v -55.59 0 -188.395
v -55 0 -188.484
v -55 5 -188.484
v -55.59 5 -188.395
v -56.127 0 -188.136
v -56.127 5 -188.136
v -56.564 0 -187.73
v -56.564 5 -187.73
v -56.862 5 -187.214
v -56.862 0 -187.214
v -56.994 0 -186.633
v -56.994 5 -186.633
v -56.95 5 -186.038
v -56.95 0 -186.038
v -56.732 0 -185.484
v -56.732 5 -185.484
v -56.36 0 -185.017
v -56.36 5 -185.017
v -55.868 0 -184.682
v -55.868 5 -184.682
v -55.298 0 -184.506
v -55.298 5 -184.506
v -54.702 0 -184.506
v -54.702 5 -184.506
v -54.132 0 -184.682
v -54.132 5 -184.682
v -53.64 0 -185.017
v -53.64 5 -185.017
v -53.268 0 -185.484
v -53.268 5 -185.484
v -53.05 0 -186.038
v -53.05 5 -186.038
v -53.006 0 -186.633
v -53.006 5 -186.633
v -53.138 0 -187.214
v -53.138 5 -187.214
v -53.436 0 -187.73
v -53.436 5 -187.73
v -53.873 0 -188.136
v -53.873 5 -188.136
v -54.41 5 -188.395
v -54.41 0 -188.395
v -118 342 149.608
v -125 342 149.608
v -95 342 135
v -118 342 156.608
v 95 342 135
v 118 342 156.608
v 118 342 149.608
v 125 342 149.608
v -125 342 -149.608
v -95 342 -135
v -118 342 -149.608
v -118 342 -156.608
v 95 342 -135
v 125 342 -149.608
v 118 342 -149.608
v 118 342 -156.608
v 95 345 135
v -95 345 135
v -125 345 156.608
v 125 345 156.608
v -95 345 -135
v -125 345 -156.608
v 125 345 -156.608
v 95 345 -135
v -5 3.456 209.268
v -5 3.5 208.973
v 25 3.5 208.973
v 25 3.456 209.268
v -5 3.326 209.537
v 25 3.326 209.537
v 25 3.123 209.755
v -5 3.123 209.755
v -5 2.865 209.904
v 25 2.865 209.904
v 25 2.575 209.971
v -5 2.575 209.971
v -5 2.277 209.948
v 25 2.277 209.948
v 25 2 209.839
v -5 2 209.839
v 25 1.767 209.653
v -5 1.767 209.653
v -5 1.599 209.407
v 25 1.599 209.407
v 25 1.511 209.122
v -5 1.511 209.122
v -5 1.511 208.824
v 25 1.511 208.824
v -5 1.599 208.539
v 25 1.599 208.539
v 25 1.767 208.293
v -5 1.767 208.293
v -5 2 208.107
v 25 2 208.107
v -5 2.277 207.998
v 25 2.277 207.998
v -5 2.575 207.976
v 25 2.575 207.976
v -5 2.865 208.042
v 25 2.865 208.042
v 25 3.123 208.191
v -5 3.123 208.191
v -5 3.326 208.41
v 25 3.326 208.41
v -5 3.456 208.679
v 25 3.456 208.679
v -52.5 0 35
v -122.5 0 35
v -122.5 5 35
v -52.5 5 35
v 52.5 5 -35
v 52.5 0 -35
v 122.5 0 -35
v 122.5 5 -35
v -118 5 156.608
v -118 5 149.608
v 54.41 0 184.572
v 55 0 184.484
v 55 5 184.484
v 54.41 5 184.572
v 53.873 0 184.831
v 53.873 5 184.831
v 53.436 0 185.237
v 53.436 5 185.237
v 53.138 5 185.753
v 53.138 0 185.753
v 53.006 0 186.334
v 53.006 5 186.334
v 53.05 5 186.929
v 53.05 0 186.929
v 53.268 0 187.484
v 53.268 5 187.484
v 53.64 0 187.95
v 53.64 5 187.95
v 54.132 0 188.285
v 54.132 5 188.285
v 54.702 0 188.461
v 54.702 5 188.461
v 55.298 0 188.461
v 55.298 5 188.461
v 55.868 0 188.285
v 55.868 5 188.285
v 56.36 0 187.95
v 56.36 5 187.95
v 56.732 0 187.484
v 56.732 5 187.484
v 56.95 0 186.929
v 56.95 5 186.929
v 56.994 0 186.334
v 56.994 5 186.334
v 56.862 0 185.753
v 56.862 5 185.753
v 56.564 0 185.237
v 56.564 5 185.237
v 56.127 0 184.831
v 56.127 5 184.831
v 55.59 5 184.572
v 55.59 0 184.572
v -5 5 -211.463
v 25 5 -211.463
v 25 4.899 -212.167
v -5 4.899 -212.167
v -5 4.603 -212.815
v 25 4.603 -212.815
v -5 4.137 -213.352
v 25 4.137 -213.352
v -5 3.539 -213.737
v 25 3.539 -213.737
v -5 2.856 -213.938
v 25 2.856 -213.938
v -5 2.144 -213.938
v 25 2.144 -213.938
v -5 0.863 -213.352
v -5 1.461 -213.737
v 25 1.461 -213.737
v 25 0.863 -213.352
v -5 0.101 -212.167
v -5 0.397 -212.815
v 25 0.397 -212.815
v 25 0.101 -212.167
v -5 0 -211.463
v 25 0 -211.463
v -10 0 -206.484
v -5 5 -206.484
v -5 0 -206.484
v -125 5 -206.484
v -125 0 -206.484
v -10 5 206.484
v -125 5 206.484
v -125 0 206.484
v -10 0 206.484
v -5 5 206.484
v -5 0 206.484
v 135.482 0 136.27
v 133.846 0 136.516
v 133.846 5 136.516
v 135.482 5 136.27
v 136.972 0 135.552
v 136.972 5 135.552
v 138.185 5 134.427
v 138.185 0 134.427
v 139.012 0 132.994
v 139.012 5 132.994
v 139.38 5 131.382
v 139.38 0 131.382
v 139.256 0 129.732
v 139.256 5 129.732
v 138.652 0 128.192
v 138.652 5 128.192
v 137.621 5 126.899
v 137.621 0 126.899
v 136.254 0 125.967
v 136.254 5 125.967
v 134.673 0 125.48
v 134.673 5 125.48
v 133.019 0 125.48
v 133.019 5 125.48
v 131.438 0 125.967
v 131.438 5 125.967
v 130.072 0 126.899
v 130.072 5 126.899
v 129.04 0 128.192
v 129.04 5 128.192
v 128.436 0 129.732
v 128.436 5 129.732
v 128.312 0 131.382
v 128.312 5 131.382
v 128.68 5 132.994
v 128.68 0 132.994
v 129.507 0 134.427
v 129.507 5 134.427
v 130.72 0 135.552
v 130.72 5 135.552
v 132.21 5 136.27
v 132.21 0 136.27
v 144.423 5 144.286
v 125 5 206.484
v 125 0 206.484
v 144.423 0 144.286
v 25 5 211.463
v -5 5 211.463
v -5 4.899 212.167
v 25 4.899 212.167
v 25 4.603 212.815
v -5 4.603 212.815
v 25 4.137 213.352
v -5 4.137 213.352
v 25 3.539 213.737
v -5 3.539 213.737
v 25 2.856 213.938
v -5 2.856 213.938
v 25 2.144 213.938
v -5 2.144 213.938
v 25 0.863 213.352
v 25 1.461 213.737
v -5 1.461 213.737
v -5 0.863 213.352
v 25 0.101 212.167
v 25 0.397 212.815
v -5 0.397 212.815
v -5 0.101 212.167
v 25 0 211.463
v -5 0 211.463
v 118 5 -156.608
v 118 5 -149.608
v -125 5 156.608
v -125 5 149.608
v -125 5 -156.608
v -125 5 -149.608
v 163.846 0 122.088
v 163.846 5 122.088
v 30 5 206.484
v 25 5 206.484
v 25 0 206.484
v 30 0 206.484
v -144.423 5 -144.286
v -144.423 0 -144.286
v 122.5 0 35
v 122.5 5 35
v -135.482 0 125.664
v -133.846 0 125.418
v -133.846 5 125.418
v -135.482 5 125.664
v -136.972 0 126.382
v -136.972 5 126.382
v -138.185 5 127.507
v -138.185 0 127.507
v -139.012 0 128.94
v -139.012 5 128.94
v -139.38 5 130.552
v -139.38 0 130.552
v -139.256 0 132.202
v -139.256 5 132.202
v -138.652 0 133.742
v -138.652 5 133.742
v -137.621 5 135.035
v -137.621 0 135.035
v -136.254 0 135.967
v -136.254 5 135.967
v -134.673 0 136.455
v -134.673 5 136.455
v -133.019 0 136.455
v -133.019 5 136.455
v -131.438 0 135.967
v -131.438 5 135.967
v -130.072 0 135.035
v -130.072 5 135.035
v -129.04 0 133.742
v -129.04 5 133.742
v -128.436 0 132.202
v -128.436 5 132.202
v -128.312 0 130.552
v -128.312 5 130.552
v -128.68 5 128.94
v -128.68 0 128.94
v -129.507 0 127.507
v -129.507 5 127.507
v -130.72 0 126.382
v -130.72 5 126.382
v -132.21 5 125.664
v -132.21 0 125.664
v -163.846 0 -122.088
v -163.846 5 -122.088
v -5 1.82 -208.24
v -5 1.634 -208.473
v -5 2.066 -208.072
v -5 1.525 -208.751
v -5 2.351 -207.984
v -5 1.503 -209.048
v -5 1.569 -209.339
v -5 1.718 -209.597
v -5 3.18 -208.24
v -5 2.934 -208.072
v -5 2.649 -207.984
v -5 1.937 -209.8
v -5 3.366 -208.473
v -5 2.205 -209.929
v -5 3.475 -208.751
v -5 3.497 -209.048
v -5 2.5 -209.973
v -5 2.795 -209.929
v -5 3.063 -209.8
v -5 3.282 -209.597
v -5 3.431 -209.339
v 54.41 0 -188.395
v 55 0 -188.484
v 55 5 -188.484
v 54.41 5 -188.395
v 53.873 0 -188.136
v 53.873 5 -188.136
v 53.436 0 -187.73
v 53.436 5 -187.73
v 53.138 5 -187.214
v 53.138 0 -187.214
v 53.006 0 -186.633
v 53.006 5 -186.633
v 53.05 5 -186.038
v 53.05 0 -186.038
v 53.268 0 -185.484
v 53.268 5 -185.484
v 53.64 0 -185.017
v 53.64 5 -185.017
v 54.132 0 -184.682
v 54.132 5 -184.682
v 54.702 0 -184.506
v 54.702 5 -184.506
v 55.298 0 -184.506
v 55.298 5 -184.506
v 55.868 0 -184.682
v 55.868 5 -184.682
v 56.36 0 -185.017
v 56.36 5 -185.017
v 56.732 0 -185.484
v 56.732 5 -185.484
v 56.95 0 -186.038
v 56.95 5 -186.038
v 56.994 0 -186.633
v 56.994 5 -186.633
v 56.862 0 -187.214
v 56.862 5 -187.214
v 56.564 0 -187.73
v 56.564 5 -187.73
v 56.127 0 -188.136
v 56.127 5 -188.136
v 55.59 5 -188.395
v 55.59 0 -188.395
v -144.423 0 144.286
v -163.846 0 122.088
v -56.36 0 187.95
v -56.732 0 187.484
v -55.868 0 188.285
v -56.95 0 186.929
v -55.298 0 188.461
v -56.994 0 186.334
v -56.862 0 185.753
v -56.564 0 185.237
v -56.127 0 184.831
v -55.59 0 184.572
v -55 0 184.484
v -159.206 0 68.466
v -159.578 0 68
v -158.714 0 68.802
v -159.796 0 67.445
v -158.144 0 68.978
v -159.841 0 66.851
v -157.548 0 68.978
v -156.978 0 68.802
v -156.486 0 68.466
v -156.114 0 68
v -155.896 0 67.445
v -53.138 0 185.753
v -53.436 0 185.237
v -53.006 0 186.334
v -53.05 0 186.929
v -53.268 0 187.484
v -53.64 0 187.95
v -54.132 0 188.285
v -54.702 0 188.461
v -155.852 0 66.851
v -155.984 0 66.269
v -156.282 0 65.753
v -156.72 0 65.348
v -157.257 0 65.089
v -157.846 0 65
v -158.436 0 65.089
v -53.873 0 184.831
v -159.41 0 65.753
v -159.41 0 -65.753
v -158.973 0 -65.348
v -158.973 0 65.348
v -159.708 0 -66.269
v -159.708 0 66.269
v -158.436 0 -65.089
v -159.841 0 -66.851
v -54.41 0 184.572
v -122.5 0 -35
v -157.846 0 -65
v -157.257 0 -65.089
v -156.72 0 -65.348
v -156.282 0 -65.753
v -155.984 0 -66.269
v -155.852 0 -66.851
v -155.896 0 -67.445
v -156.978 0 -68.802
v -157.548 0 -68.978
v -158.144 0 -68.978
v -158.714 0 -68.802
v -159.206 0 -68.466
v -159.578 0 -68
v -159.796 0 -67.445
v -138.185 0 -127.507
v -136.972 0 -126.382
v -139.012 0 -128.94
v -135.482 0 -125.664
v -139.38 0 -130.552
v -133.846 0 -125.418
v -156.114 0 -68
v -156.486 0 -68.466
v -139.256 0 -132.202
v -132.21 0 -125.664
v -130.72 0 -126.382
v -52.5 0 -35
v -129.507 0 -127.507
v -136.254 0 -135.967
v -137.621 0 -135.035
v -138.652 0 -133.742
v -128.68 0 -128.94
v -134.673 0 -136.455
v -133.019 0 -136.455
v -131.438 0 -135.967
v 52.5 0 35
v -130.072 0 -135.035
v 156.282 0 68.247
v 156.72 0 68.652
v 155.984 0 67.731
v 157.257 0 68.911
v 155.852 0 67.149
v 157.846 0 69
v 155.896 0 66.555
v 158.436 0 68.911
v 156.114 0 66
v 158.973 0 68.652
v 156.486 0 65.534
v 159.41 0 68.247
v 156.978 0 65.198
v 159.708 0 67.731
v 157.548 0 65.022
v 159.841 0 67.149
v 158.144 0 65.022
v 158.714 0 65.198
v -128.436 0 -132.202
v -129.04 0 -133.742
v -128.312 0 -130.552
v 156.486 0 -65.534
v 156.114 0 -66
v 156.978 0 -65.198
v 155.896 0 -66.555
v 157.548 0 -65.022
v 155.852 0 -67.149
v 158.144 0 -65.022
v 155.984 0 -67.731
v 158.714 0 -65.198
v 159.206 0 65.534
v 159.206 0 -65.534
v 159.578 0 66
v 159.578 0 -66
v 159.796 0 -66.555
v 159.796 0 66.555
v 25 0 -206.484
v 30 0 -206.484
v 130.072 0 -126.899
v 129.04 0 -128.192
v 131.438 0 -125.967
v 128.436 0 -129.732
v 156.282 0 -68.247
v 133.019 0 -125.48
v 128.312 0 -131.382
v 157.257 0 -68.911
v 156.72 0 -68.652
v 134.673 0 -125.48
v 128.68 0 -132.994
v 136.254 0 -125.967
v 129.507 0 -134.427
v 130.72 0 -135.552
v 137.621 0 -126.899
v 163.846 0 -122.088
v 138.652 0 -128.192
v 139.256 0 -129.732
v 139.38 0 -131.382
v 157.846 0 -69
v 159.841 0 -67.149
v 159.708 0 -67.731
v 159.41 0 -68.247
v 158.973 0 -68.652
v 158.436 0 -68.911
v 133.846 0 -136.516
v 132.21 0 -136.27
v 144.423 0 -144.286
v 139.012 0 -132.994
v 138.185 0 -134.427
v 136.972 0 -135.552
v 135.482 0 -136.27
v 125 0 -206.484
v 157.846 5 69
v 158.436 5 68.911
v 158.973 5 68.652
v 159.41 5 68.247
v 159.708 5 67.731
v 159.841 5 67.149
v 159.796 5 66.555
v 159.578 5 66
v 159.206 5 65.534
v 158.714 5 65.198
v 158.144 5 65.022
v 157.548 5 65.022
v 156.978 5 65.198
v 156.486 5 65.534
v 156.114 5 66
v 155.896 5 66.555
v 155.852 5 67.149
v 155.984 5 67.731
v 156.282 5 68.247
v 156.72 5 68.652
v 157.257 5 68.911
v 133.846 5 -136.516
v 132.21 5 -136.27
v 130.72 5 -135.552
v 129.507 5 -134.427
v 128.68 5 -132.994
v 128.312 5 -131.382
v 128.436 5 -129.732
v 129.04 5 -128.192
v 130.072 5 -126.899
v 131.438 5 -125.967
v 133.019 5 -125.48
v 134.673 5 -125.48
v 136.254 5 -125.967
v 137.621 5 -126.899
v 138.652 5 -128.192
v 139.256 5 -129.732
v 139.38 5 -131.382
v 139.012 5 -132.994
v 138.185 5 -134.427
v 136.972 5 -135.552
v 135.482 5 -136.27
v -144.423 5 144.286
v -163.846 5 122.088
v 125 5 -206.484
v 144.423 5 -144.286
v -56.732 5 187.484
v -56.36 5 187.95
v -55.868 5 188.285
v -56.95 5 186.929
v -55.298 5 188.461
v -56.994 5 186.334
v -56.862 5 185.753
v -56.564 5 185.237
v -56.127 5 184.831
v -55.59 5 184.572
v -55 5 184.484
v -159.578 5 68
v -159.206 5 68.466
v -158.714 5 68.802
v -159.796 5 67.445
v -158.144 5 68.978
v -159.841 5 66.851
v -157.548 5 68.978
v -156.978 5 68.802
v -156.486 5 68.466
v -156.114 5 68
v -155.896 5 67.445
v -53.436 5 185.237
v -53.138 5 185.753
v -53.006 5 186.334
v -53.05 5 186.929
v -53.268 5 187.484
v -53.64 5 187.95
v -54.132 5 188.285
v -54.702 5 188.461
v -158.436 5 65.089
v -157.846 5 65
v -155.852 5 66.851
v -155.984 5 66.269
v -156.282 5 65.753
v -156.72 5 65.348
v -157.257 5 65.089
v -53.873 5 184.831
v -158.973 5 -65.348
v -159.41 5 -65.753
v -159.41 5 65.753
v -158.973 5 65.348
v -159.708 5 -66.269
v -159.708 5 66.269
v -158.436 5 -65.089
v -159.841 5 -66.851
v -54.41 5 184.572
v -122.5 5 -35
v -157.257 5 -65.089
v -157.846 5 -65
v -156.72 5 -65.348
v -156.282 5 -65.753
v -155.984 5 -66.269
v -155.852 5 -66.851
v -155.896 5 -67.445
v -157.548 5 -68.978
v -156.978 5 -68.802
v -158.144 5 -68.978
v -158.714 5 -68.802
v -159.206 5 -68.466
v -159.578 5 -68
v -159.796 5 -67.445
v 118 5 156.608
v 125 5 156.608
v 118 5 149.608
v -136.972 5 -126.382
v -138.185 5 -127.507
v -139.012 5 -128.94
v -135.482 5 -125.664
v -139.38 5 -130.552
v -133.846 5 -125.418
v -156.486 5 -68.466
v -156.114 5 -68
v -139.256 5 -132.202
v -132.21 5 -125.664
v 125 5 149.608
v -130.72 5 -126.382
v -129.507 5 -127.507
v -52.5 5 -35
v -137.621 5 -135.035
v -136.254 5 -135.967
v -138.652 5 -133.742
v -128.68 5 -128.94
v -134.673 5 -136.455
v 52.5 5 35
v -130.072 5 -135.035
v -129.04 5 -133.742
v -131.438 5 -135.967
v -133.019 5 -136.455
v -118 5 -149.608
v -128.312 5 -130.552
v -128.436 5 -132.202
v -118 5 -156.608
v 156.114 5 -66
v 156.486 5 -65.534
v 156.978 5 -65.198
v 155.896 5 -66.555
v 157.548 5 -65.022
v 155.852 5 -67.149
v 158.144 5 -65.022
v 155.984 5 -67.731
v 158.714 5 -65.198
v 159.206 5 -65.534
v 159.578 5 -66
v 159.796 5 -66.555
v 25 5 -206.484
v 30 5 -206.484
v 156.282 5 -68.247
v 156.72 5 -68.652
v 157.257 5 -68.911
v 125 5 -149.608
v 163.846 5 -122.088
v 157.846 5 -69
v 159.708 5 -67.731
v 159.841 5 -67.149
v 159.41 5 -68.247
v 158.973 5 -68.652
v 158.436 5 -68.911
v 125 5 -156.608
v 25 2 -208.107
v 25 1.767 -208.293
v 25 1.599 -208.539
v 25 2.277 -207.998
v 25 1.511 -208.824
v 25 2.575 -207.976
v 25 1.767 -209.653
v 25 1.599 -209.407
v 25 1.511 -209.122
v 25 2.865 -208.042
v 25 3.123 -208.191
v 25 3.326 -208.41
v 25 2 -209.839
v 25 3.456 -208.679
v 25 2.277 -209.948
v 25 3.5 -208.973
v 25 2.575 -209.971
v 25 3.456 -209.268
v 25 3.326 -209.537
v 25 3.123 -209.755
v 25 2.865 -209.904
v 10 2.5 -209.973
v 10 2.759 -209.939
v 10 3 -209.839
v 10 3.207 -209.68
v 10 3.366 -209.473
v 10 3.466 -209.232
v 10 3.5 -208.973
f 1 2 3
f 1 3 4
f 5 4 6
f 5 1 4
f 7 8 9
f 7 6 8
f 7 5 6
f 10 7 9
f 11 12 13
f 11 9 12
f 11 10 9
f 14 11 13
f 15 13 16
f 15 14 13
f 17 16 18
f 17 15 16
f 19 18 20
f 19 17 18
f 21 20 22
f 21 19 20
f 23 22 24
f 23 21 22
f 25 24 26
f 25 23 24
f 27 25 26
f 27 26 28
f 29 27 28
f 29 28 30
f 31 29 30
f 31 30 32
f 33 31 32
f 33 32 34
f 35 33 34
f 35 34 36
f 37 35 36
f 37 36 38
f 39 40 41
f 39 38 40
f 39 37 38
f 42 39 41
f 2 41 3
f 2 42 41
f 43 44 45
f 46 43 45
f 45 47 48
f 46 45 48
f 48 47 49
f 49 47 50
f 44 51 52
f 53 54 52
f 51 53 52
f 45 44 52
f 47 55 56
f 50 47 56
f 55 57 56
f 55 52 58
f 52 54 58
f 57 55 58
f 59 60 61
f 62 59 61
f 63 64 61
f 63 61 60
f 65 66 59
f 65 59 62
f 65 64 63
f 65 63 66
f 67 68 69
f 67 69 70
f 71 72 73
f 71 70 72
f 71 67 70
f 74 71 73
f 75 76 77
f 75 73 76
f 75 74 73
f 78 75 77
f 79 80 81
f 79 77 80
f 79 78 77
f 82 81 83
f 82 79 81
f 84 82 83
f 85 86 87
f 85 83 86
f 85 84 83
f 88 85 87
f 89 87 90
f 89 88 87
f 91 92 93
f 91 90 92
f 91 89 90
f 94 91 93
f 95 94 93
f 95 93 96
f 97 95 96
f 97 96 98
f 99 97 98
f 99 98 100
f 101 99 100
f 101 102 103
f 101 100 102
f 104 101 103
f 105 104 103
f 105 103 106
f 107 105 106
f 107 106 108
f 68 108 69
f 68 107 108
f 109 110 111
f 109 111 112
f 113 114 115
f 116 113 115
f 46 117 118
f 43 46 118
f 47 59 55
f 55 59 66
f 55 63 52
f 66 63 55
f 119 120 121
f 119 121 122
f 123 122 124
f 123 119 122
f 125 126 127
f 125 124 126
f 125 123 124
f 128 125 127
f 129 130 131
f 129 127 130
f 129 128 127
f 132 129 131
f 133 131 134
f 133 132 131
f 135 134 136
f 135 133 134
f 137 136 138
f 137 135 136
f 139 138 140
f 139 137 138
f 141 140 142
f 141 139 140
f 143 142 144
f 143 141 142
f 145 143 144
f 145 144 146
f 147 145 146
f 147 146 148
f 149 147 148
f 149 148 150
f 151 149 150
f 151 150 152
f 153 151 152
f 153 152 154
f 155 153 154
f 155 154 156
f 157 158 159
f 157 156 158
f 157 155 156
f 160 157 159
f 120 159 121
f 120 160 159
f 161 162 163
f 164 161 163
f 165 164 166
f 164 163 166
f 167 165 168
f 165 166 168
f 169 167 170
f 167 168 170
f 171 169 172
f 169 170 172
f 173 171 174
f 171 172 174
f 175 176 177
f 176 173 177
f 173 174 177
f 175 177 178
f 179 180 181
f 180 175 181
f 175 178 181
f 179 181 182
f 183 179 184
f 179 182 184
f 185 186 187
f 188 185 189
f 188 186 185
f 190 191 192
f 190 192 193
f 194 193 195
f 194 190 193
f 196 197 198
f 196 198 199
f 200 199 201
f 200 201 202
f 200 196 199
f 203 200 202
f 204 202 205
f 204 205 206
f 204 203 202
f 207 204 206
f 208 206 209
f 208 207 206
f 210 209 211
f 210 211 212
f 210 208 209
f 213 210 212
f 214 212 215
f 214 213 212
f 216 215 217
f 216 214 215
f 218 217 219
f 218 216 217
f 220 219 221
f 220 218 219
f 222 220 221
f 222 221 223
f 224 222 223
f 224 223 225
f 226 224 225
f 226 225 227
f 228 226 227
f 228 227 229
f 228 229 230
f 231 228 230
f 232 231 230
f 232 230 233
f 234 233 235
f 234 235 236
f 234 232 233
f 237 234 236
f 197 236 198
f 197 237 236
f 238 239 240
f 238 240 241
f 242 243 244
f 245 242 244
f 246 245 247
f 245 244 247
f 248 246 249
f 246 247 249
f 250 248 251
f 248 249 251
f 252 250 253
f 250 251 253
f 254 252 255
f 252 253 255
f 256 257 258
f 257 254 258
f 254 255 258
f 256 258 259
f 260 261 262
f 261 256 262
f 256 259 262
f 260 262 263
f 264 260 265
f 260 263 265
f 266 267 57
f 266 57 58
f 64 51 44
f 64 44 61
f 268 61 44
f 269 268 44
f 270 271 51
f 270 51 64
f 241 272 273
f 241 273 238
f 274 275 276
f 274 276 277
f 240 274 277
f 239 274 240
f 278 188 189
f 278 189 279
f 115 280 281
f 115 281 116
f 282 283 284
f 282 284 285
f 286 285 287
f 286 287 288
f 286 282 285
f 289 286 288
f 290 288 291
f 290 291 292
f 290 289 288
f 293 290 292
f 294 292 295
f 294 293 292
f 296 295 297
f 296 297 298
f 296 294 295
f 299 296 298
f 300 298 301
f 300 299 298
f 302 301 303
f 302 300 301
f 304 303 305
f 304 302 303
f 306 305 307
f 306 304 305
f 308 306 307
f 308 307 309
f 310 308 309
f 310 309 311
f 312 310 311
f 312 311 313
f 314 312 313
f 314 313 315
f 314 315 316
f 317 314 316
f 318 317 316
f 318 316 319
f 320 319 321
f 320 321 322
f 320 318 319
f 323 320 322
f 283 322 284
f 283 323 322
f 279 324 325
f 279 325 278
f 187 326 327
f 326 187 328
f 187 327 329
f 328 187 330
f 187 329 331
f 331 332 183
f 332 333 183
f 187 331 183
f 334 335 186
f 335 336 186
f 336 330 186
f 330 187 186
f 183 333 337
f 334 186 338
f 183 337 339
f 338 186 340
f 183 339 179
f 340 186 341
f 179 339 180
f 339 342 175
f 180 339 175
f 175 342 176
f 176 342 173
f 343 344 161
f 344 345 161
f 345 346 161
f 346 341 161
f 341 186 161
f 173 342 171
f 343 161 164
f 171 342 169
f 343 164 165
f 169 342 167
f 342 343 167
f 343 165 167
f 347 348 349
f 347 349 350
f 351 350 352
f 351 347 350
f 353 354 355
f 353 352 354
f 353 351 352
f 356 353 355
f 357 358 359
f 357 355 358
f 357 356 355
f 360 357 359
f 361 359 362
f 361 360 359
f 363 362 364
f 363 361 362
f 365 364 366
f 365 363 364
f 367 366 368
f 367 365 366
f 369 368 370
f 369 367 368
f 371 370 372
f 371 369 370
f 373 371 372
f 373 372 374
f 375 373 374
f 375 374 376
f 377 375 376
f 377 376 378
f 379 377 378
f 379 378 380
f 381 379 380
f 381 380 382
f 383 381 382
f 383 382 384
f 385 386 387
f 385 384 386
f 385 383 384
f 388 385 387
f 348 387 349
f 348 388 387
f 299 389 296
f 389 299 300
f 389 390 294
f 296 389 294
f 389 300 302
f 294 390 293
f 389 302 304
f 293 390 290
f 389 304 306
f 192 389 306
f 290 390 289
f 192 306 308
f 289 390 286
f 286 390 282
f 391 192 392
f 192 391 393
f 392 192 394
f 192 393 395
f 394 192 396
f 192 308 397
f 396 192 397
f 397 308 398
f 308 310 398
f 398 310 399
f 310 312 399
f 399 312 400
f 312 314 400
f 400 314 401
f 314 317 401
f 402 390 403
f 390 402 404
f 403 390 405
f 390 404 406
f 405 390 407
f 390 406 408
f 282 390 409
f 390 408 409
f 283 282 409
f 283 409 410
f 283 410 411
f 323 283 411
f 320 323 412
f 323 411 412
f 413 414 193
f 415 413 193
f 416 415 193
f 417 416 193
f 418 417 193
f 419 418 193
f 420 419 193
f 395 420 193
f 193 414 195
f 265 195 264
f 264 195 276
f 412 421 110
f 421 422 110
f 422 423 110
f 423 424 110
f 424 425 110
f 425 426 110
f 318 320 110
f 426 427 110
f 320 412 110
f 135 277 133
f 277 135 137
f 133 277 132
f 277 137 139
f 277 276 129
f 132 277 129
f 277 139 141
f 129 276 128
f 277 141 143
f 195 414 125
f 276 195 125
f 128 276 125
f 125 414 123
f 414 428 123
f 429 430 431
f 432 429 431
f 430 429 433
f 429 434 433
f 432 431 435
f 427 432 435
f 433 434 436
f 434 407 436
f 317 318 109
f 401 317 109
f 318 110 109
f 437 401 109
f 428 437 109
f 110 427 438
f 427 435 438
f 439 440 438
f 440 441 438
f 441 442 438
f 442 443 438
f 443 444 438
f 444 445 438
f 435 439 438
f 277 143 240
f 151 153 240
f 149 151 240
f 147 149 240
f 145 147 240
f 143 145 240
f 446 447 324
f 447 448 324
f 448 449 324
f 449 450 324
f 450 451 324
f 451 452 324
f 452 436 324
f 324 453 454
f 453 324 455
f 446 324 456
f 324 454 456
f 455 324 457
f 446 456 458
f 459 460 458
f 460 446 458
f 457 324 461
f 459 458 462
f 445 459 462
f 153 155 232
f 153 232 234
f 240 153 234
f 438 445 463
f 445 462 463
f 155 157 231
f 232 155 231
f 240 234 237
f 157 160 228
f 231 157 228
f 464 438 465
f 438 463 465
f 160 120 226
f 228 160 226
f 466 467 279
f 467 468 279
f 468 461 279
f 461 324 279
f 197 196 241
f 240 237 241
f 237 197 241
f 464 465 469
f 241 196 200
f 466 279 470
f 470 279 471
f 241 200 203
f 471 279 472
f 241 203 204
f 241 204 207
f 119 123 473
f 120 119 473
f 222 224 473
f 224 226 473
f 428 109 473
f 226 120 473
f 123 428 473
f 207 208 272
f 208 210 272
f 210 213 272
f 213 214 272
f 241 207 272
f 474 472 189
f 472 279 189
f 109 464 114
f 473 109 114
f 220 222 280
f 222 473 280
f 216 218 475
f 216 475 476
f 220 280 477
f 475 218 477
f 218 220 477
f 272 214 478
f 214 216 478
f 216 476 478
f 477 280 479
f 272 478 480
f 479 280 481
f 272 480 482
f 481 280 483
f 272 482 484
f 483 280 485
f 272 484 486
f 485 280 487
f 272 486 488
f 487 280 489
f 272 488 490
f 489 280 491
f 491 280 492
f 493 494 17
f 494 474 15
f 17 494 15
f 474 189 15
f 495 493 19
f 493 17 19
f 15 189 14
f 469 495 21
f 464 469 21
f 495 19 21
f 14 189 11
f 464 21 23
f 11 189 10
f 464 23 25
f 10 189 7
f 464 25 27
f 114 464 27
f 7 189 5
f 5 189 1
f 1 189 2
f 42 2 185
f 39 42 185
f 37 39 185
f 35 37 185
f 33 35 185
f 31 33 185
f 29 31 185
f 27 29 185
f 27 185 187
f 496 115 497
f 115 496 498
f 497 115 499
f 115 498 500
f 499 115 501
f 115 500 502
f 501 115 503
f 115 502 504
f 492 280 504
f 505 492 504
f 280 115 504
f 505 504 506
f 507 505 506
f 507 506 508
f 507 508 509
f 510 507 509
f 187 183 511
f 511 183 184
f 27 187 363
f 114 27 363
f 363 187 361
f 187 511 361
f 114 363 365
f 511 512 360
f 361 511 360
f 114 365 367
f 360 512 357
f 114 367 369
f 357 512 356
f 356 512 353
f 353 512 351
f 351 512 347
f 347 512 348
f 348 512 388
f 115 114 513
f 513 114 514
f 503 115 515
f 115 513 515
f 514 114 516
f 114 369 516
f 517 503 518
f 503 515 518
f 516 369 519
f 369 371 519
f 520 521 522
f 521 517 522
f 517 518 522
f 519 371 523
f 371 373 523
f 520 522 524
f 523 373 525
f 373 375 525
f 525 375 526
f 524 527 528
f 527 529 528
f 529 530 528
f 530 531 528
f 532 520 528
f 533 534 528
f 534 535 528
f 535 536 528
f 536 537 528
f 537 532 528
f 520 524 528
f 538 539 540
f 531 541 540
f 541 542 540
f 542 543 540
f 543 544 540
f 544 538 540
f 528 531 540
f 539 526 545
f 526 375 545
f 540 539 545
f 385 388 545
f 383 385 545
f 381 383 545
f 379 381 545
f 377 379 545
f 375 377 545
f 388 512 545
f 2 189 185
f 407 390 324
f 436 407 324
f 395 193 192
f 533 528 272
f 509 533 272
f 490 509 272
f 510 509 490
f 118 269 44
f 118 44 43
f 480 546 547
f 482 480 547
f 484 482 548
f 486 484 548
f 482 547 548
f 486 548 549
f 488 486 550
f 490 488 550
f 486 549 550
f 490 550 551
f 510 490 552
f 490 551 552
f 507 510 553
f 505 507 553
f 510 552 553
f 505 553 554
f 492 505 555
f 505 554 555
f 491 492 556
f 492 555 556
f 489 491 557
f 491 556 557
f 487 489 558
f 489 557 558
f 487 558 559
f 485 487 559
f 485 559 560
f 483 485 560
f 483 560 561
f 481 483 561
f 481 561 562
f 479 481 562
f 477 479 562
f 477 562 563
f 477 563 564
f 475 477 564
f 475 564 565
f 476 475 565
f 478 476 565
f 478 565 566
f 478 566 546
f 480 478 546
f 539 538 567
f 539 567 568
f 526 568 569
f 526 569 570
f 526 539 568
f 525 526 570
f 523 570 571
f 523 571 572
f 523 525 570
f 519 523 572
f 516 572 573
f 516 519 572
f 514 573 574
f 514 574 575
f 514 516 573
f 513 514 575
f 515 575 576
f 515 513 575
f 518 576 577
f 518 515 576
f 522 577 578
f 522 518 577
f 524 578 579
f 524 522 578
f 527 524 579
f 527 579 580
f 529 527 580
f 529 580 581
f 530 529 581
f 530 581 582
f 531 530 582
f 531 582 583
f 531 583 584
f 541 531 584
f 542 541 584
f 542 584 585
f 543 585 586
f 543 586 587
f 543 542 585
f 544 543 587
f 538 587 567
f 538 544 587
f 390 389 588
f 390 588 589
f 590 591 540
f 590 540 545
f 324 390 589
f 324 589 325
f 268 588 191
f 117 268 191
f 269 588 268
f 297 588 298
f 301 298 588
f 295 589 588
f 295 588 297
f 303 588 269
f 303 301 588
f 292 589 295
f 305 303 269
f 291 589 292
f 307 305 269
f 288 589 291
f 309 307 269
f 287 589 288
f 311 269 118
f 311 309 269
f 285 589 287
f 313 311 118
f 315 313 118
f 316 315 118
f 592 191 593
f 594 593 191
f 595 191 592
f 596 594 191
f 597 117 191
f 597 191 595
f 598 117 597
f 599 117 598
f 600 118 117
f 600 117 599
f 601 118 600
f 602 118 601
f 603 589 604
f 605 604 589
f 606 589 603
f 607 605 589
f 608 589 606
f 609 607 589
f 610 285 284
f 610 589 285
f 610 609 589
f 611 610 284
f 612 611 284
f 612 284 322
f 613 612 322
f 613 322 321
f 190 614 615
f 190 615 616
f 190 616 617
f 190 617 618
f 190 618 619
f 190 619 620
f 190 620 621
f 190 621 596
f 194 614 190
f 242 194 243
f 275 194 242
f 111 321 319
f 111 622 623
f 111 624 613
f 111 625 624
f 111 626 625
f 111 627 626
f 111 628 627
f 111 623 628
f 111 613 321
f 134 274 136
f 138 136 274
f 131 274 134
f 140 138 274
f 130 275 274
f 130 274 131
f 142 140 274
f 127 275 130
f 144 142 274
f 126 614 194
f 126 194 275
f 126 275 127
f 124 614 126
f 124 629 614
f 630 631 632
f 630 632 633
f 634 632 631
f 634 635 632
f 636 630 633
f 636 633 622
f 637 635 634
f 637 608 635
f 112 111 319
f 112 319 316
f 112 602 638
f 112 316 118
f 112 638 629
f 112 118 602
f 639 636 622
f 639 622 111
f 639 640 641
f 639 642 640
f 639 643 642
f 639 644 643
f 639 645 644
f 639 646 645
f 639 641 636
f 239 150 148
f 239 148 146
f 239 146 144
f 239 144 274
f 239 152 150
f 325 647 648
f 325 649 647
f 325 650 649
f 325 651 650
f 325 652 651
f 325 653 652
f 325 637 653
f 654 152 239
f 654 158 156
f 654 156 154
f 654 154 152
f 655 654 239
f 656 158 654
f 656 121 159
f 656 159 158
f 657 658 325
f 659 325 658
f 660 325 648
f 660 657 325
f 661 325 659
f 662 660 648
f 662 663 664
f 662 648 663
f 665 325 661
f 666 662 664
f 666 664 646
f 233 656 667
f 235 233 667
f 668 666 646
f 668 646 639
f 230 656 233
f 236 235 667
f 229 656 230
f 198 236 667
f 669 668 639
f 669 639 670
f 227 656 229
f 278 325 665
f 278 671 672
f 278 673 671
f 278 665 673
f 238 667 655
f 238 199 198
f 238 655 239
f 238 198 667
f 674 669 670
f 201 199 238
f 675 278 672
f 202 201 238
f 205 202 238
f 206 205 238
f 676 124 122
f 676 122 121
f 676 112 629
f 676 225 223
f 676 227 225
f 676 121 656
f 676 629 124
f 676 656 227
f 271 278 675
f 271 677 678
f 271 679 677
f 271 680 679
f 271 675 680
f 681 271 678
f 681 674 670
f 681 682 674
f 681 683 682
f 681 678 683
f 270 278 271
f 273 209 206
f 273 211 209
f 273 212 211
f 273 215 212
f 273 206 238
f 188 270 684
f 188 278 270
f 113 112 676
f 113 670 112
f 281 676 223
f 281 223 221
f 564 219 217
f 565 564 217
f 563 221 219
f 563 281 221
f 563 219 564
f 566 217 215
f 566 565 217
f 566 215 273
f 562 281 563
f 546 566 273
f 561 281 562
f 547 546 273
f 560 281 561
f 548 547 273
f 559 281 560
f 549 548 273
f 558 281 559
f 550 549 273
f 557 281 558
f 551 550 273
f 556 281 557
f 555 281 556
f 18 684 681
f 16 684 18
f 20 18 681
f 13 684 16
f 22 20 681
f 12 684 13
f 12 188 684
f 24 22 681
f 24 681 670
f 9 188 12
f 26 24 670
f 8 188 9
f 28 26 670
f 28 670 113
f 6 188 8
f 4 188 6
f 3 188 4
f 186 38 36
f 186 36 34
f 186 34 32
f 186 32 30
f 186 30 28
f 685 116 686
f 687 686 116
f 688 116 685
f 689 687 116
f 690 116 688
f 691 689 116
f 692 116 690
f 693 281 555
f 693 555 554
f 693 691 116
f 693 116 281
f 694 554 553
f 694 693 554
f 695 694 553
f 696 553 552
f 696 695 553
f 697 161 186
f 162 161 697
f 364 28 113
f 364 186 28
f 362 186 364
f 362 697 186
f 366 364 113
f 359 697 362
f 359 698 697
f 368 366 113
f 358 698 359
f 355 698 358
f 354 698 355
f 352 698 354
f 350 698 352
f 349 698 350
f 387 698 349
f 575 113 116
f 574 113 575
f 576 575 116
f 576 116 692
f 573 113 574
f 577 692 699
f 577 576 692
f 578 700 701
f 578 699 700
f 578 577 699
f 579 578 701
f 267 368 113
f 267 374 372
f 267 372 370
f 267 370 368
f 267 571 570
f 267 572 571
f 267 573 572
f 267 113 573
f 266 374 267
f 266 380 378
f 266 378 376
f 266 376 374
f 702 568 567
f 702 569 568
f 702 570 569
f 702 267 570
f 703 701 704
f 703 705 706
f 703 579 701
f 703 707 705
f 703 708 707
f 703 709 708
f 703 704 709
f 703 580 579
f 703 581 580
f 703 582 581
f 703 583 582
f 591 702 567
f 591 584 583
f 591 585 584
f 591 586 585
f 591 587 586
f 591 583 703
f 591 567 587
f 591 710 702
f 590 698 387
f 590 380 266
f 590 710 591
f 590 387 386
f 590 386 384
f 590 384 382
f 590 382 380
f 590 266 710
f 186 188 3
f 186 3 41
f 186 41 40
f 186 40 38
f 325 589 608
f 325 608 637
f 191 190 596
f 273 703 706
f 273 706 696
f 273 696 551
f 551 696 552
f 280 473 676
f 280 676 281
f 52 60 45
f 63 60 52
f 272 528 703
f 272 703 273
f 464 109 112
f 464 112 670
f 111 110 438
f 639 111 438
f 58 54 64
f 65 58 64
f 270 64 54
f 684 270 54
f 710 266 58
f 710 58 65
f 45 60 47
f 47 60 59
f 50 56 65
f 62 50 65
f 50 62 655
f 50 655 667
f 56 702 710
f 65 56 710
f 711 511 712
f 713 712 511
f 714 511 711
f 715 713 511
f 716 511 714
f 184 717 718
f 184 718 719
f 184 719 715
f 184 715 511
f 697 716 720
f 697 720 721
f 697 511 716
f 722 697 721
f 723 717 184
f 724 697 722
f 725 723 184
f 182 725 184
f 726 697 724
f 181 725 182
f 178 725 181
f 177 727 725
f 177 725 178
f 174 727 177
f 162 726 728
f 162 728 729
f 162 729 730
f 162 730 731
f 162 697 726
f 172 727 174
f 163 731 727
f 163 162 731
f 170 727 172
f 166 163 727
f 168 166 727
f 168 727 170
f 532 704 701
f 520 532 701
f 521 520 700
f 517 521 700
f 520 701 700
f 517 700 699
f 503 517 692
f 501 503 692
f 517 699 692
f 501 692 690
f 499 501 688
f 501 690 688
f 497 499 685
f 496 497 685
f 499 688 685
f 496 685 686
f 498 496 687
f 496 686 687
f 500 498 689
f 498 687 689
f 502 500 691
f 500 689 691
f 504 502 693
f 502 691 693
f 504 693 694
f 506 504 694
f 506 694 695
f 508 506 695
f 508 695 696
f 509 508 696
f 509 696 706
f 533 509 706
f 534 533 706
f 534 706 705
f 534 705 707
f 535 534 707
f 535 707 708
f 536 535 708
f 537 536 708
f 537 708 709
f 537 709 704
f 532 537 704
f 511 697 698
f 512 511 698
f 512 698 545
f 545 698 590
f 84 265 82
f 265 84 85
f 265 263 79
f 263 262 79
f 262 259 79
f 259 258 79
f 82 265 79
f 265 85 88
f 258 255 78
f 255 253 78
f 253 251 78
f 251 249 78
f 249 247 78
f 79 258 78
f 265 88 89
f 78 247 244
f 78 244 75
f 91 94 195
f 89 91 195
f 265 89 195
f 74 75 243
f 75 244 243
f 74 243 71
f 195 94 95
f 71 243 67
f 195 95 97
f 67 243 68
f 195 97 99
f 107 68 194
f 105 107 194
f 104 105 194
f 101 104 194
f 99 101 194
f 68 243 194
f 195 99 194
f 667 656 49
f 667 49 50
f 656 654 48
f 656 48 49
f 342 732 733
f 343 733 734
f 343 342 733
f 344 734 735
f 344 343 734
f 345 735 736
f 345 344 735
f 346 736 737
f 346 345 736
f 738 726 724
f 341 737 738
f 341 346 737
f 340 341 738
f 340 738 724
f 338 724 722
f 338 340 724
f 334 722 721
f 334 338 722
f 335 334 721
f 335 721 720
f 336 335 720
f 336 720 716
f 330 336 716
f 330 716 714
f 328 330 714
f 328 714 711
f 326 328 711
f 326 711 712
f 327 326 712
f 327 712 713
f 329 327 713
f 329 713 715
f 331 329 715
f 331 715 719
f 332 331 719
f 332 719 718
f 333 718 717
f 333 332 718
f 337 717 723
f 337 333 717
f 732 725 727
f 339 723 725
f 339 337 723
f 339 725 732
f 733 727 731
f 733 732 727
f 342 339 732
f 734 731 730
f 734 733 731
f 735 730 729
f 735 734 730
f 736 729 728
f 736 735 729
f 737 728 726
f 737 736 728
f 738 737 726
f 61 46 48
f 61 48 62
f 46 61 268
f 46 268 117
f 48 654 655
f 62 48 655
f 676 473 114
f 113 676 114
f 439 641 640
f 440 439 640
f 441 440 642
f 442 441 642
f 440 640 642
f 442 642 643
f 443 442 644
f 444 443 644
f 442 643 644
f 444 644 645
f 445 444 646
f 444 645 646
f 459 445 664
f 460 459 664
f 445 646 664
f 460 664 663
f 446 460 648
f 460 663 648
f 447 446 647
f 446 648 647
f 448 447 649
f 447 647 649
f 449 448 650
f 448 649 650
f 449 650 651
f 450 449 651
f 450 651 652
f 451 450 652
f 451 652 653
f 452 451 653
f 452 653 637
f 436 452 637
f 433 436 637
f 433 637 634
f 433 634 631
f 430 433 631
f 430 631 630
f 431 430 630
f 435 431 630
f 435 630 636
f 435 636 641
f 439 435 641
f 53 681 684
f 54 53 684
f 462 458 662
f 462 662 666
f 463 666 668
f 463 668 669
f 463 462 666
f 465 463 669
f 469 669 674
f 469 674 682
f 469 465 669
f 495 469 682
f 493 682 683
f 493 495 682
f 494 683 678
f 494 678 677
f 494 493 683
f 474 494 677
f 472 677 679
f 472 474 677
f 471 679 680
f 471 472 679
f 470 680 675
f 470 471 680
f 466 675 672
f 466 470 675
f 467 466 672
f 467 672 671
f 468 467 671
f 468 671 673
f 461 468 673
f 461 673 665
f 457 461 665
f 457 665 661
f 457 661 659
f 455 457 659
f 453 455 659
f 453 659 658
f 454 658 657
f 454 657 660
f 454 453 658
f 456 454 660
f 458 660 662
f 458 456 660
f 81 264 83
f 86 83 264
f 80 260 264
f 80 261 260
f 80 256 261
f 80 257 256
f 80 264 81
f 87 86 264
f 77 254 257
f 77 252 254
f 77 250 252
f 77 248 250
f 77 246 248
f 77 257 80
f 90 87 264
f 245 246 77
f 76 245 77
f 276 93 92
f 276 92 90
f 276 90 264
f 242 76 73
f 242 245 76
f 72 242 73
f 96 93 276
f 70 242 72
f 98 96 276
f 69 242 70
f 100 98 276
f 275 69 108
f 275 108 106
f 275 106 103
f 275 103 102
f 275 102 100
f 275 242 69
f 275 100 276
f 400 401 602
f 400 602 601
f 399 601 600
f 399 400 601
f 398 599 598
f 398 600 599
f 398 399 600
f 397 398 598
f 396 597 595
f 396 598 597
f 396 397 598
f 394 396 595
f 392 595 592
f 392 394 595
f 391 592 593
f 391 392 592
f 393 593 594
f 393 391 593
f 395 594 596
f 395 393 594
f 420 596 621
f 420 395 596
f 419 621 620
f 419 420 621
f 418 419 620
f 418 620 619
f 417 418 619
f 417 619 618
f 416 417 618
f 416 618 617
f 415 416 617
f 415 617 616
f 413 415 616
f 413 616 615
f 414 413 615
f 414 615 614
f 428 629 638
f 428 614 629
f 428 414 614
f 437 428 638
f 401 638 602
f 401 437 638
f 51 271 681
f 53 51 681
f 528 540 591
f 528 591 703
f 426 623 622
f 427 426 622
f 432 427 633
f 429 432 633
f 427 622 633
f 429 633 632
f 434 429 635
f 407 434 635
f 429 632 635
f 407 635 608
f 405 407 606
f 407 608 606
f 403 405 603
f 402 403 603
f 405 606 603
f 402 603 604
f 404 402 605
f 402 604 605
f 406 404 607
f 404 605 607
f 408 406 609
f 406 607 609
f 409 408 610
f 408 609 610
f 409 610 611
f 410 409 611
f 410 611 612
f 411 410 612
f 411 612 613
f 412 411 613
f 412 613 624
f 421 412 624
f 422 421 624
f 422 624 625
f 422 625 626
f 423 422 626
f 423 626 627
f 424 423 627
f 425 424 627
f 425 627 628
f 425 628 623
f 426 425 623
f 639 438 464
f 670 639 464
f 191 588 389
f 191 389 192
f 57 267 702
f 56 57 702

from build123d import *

# Parameters (mm, degrees)
ESQUISSE1_R                  = 5.549450549
ESQUISSE1_W                  = 8
ESQUISSE1_H                  = 94.34065934
ESQUISSE1_W_2                = 70
ESQUISSE1_H_2                = 70
BOSS_EXTRU_1_DEPTH           = 5
ESQUISSE4_R                  = 2
ENL_V_MAT_EXTRU_5_DEPTH      = 350
ESQUISSE9_W                  = 8
ESQUISSE9_H                  = 94.34065934
BOSS_EXTRU_2_DEPTH           = 5
BOSS_EXTRU_4_DEPTH           = 5
ESQUISSE11_W                 = 7
ESQUISSE11_H                 = 7
BOSS_EXTRU_6_DEPTH           = 340
ENL_V_MAT_EXTRU_6_DEPTH      = 10
ENL_V_MAT_EXTRU_6_DEPTH_BACK = 10
ESQUISSE12_R                 = 2
ESQUISSE14_R                 = 1
BOSS_EXTRU_8_DEPTH           = 10
SYM_TRIE1_START              = -10
SYM_TRIE1_OUTLINE_R          = 1
SYM_TRIE1_DEPTH              = 40
ESQUISSE15_W                 = 5
ESQUISSE15_H                 = 10.313810077
ENL_V_MAT_EXTRU_7_DEPTH      = 5
ESQUISSE17_W                 = 250
ESQUISSE17_H                 = 313.215569532
BOSS_EXTRU_9_DEPTH           = 3
ESQUISSE18_W                 = 190
ESQUISSE18_H                 = 270
ENL_V_MAT_EXTRU_8_DEPTH      = 24


# Read off the part's stored shape, not the designer's step: Symétrie1
with BuildPart() as part:
    # Esquisse1 → Boss.-Extru.1 (new body)
    with BuildSketch(Plane(origin=(0, 0, 0), x_dir=(1, 0, 0), z_dir=(0, 1, 0))):
        Polygon((-125, 166.483516484), (125, 166.483516484), (163.846153846, 122.087912088), (163.846153846, -122.087912088), (125, -166.483516484), (-125, -166.483516484), (-163.846153846, -122.087912088), (-163.846153846, 122.087912088), align=None)
        with Locations(Location((-133.846153846, 130.967032967, 0), (0, 0, 270))):
            Circle(ESQUISSE1_R, mode=Mode.SUBTRACT)
        with Locations(Location((-133.846153846, -130.967032967, 0), (0, 0, 90))):
            Circle(ESQUISSE1_R, mode=Mode.SUBTRACT)
        with Locations(Location((133.846153846, -130.967032967, 0), (0, 0, 270))):
            Circle(ESQUISSE1_R, mode=Mode.SUBTRACT)
        with Locations(Location((133.846153846, 130.967032967, 0), (0, 0, 90))):
            Circle(ESQUISSE1_R, mode=Mode.SUBTRACT)
        with Locations((-144, 0)):
            Rectangle(ESQUISSE1_W, ESQUISSE1_H, mode=Mode.SUBTRACT)
        with Locations((87.5, 0)):
            Rectangle(ESQUISSE1_W_2, ESQUISSE1_H_2, mode=Mode.SUBTRACT)
        with Locations((-87.5, 0)):
            Rectangle(ESQUISSE1_W_2, ESQUISSE1_H_2, mode=Mode.SUBTRACT)
        with Locations((144, 0)):
            Rectangle(ESQUISSE1_W, ESQUISSE1_H, mode=Mode.SUBTRACT)
    extrude(amount=BOSS_EXTRU_1_DEPTH)

    # Esquisse4 → Enlèv. mat.-Extru.5 (cut)
    with BuildSketch(Plane(origin=(0, 5, 0), x_dir=(1, 0, 0), z_dir=(0, 1, 0))):
        with Locations(Location((-157.846153846, 67, 0), (0, 0, 270))):
            Circle(ESQUISSE4_R)
        with Locations(Location((157.846153846, 67, 0), (0, 0, 90))):
            Circle(ESQUISSE4_R)
        with Locations(Location((-157.846153846, -67, 0), (0, 0, 90))):
            Circle(ESQUISSE4_R)
        with Locations(Location((157.846153846, -67, 0), (0, 0, 270))):
            Circle(ESQUISSE4_R)
    extrude(amount=-ENL_V_MAT_EXTRU_5_DEPTH, mode=Mode.SUBTRACT)

    # Esquisse9 → Boss.-Extru.2 (add)
    with BuildSketch(Plane(origin=(0, 5, 0), x_dir=(1, 0, 0), z_dir=(0, 1, 0))):
        with Locations((-144, 0)):
            Rectangle(ESQUISSE9_W, ESQUISSE9_H)
        with Locations((144, 0)):
            Rectangle(ESQUISSE9_W, ESQUISSE9_H)
    extrude(amount=-BOSS_EXTRU_2_DEPTH)

    # Esquisse10 → Boss.-Extru.4 (add)
    with BuildSketch(Plane(origin=(0, 5, 0), x_dir=(1, 0, 0), z_dir=(0, 1, 0))):
        Polygon((-125, 206.483516484), (-144.423076923, 144.285714286), (144.423076923, 144.285714286), (125, 206.483516484), align=None)
        Polygon((125, -206.483516484), (144.423076923, -144.285714286), (-144.423076923, -144.285714286), (-125, -206.483516484), align=None)
    extrude(amount=-BOSS_EXTRU_4_DEPTH)

    # Esquisse11 → Boss.-Extru.6 (add)
    with BuildSketch(Plane(origin=(0, 5, 0), x_dir=(1, 0, 0), z_dir=(0, 1, 0))):
        with Locations((121.5, -153.107784766)):
            Rectangle(ESQUISSE11_W, ESQUISSE11_H)
        with Locations((-121.5, -153.107784766)):
            Rectangle(ESQUISSE11_W, ESQUISSE11_H)
        with Locations((121.5, 153.107784766)):
            Rectangle(ESQUISSE11_W, ESQUISSE11_H)
        with Locations((-121.5, 153.107784766)):
            Rectangle(ESQUISSE11_W, ESQUISSE11_H)
    extrude(amount=BOSS_EXTRU_6_DEPTH)

    # Esquisse12 → Enlèv. mat.-Extru.6 (cut, two sides: drawn at the far end of the back side and taken through both)
    with BuildSketch(Plane(origin=(0, 5, 0), x_dir=(1, 0, 0), z_dir=(0, 1, 0)).offset(-ENL_V_MAT_EXTRU_6_DEPTH_BACK)):
        with Locations(Location((-55, 186.483516484, 0), (0, 0, 90))):
            Circle(ESQUISSE12_R)
        with Locations(Location((55, 186.483516484, 0), (0, 0, 90))):
            Circle(ESQUISSE12_R)
        with Locations(Location((55, -186.483516484, 0), (0, 0, 90))):
            Circle(ESQUISSE12_R)
        with Locations(Location((-55, -186.483516484, 0), (0, 0, 90))):
            Circle(ESQUISSE12_R)
    extrude(amount=ENL_V_MAT_EXTRU_6_DEPTH + ENL_V_MAT_EXTRU_6_DEPTH_BACK, mode=Mode.SUBTRACT)

    # Esquisse14 → Boss.-Extru.8 (add, symmetric)
    with BuildSketch(Plane(origin=(0, 0, 0), x_dir=(0, 0, -1), z_dir=(1, 0, 0))):
        with BuildLine():
            Line((206.483516484, 5), (211.463094512, 5))
            ThreePointArc((211.463094512, 5), (213.963094512, 2.5), (211.463094512, 0))
            Line((211.463094512, 0), (206.483516484, 0))
            Line((206.483516484, 0), (206.483516484, 5))
        make_face()
        with Locations((208.973305498, 2.5)):
            Circle(ESQUISSE14_R, mode=Mode.SUBTRACT)
    extrude(amount=BOSS_EXTRU_8_DEPTH, both=True)

    # Symétrie1 outline → Symétrie1 (add)
    # profile 1 of 2: a face of its own
    with BuildSketch(Plane.YZ.offset(SYM_TRIE1_START)):
        with BuildLine():
            Line((0, -206.483516484), (0, -211.463094512))
            ThreePointArc((0, -211.463094512), (2.5, -213.963094512), (5, -211.463094512))
            Line((5, -211.463094512), (5, -206.483516484))
            Line((5, -206.483516484), (0, -206.483516484))
        make_face()
        with Locations((2.5, -208.973305498)):
            Circle(SYM_TRIE1_OUTLINE_R, mode=Mode.SUBTRACT)
    # profile 2 of 2: a face of its own
    with BuildSketch(Plane.YZ.offset(SYM_TRIE1_START)):
        with BuildLine():
            Line((0, 211.463094512), (0, 206.483516484))
            Line((0, 206.483516484), (5, 206.483516484))
            Line((5, 206.483516484), (5, 211.463094512))
            ThreePointArc((5, 211.463094512), (2.5, 213.963094512), (0, 211.463094512))
        make_face()
        with Locations((2.5, 208.973305498)):
            Circle(SYM_TRIE1_OUTLINE_R, mode=Mode.SUBTRACT)
    extrude(amount=SYM_TRIE1_DEPTH)

    # Esquisse15 → Enlèv. mat.-Extru.7 (cut)
    with BuildSketch(Plane(origin=(0, 5, 0), x_dir=(1, 0, 0), z_dir=(0, 1, 0))):
        with Locations((-7.5, 211.640421522)):
            Rectangle(ESQUISSE15_W, ESQUISSE15_H)
        with Locations((27.5, 211.640421522)):
            Rectangle(ESQUISSE15_W, ESQUISSE15_H)
        with Locations((27.5, -211.640421522)):
            Rectangle(ESQUISSE15_W, ESQUISSE15_H)
        with Locations((-7.5, -211.640421522)):
            Rectangle(ESQUISSE15_W, ESQUISSE15_H)
    extrude(amount=-ENL_V_MAT_EXTRU_7_DEPTH, mode=Mode.SUBTRACT)

    # Esquisse17 → Boss.-Extru.9 (add)
    with BuildSketch(Plane(origin=(0, 345, 0), x_dir=(1, 0, 0), z_dir=(0, 1, 0))):
        Rectangle(ESQUISSE17_W, ESQUISSE17_H)
    extrude(amount=-BOSS_EXTRU_9_DEPTH)

    # Esquisse18 → Enlèv. mat.-Extru.8 (cut)
    with BuildSketch(Plane(origin=(0, 345, 0), x_dir=(1, 0, 0), z_dir=(0, 1, 0))):
        Rectangle(ESQUISSE18_W, ESQUISSE18_H)
    extrude(amount=-ENL_V_MAT_EXTRU_8_DEPTH, mode=Mode.SUBTRACT)


solid = part.part
